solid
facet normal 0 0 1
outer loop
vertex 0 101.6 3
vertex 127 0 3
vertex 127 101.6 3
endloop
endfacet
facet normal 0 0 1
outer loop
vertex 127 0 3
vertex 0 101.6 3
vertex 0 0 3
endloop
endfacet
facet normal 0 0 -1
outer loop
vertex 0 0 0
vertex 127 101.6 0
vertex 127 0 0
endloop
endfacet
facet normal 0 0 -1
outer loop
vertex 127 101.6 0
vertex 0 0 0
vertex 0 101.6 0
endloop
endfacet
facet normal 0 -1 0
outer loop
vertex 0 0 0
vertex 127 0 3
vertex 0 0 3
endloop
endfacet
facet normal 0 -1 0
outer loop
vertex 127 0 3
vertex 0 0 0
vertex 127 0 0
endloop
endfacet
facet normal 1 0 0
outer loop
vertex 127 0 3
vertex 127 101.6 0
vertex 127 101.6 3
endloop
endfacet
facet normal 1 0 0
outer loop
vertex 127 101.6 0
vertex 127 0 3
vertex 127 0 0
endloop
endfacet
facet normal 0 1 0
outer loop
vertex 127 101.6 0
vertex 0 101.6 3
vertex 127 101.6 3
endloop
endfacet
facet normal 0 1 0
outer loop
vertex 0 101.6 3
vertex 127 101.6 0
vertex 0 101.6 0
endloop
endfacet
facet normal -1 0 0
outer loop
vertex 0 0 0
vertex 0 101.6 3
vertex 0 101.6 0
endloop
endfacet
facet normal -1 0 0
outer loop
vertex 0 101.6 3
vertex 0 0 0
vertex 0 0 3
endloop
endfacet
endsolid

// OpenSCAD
// file: ../utils/colorstl.scad
module colorpart(clr) {
  color(colors[clr])
  if (clr==current_color || current_color==-1) {
    children();
  }
  else {
  }
}
// main file
inch = 25.4;
colors=["yellow", "black"];

// changes to 0 to export the text
// change to 1 to export the card
current_color = 1;

include <../utils/colorstl.scad>

margin = .25 * inch;
card_size = [
    5 * inch,
    4 * inch,
    //.25 * inch
    3
];


// Hole parameters
hole_radius = 5;
hole_margin = 15;

colorpart(1) {
    cube(card_size);
}

colorpart(0) {
    translate([5, ((4 * inch) - 20), 3]) {
        linear_extrude(height=0.4) {
           text("Threaded Insert",size=12);
        }
    }
}

line_spacing = 16;
start_y = (4 * inch) - 38;

data_lines = [
    ["PLA ", "210c - 240c"],
    ["PETG", "235c - 250c"],
    ["ABS ", "260c - 290c"]
];

colorpart(0) {
    for (i = [0:len(data_lines)-1]) {
        // Fillament
        translate([10, start_y - (i * line_spacing), 3]) {
            linear_extrude(height=0.4) {
               text(data_lines[i][0], size=8);
            }
        }
        // Temperature
        translate([47, start_y - (i * line_spacing), 3]) {
            linear_extrude(height=0.4) {
               text(data_lines[i][1], size=8);
            }
        }
    }
}
